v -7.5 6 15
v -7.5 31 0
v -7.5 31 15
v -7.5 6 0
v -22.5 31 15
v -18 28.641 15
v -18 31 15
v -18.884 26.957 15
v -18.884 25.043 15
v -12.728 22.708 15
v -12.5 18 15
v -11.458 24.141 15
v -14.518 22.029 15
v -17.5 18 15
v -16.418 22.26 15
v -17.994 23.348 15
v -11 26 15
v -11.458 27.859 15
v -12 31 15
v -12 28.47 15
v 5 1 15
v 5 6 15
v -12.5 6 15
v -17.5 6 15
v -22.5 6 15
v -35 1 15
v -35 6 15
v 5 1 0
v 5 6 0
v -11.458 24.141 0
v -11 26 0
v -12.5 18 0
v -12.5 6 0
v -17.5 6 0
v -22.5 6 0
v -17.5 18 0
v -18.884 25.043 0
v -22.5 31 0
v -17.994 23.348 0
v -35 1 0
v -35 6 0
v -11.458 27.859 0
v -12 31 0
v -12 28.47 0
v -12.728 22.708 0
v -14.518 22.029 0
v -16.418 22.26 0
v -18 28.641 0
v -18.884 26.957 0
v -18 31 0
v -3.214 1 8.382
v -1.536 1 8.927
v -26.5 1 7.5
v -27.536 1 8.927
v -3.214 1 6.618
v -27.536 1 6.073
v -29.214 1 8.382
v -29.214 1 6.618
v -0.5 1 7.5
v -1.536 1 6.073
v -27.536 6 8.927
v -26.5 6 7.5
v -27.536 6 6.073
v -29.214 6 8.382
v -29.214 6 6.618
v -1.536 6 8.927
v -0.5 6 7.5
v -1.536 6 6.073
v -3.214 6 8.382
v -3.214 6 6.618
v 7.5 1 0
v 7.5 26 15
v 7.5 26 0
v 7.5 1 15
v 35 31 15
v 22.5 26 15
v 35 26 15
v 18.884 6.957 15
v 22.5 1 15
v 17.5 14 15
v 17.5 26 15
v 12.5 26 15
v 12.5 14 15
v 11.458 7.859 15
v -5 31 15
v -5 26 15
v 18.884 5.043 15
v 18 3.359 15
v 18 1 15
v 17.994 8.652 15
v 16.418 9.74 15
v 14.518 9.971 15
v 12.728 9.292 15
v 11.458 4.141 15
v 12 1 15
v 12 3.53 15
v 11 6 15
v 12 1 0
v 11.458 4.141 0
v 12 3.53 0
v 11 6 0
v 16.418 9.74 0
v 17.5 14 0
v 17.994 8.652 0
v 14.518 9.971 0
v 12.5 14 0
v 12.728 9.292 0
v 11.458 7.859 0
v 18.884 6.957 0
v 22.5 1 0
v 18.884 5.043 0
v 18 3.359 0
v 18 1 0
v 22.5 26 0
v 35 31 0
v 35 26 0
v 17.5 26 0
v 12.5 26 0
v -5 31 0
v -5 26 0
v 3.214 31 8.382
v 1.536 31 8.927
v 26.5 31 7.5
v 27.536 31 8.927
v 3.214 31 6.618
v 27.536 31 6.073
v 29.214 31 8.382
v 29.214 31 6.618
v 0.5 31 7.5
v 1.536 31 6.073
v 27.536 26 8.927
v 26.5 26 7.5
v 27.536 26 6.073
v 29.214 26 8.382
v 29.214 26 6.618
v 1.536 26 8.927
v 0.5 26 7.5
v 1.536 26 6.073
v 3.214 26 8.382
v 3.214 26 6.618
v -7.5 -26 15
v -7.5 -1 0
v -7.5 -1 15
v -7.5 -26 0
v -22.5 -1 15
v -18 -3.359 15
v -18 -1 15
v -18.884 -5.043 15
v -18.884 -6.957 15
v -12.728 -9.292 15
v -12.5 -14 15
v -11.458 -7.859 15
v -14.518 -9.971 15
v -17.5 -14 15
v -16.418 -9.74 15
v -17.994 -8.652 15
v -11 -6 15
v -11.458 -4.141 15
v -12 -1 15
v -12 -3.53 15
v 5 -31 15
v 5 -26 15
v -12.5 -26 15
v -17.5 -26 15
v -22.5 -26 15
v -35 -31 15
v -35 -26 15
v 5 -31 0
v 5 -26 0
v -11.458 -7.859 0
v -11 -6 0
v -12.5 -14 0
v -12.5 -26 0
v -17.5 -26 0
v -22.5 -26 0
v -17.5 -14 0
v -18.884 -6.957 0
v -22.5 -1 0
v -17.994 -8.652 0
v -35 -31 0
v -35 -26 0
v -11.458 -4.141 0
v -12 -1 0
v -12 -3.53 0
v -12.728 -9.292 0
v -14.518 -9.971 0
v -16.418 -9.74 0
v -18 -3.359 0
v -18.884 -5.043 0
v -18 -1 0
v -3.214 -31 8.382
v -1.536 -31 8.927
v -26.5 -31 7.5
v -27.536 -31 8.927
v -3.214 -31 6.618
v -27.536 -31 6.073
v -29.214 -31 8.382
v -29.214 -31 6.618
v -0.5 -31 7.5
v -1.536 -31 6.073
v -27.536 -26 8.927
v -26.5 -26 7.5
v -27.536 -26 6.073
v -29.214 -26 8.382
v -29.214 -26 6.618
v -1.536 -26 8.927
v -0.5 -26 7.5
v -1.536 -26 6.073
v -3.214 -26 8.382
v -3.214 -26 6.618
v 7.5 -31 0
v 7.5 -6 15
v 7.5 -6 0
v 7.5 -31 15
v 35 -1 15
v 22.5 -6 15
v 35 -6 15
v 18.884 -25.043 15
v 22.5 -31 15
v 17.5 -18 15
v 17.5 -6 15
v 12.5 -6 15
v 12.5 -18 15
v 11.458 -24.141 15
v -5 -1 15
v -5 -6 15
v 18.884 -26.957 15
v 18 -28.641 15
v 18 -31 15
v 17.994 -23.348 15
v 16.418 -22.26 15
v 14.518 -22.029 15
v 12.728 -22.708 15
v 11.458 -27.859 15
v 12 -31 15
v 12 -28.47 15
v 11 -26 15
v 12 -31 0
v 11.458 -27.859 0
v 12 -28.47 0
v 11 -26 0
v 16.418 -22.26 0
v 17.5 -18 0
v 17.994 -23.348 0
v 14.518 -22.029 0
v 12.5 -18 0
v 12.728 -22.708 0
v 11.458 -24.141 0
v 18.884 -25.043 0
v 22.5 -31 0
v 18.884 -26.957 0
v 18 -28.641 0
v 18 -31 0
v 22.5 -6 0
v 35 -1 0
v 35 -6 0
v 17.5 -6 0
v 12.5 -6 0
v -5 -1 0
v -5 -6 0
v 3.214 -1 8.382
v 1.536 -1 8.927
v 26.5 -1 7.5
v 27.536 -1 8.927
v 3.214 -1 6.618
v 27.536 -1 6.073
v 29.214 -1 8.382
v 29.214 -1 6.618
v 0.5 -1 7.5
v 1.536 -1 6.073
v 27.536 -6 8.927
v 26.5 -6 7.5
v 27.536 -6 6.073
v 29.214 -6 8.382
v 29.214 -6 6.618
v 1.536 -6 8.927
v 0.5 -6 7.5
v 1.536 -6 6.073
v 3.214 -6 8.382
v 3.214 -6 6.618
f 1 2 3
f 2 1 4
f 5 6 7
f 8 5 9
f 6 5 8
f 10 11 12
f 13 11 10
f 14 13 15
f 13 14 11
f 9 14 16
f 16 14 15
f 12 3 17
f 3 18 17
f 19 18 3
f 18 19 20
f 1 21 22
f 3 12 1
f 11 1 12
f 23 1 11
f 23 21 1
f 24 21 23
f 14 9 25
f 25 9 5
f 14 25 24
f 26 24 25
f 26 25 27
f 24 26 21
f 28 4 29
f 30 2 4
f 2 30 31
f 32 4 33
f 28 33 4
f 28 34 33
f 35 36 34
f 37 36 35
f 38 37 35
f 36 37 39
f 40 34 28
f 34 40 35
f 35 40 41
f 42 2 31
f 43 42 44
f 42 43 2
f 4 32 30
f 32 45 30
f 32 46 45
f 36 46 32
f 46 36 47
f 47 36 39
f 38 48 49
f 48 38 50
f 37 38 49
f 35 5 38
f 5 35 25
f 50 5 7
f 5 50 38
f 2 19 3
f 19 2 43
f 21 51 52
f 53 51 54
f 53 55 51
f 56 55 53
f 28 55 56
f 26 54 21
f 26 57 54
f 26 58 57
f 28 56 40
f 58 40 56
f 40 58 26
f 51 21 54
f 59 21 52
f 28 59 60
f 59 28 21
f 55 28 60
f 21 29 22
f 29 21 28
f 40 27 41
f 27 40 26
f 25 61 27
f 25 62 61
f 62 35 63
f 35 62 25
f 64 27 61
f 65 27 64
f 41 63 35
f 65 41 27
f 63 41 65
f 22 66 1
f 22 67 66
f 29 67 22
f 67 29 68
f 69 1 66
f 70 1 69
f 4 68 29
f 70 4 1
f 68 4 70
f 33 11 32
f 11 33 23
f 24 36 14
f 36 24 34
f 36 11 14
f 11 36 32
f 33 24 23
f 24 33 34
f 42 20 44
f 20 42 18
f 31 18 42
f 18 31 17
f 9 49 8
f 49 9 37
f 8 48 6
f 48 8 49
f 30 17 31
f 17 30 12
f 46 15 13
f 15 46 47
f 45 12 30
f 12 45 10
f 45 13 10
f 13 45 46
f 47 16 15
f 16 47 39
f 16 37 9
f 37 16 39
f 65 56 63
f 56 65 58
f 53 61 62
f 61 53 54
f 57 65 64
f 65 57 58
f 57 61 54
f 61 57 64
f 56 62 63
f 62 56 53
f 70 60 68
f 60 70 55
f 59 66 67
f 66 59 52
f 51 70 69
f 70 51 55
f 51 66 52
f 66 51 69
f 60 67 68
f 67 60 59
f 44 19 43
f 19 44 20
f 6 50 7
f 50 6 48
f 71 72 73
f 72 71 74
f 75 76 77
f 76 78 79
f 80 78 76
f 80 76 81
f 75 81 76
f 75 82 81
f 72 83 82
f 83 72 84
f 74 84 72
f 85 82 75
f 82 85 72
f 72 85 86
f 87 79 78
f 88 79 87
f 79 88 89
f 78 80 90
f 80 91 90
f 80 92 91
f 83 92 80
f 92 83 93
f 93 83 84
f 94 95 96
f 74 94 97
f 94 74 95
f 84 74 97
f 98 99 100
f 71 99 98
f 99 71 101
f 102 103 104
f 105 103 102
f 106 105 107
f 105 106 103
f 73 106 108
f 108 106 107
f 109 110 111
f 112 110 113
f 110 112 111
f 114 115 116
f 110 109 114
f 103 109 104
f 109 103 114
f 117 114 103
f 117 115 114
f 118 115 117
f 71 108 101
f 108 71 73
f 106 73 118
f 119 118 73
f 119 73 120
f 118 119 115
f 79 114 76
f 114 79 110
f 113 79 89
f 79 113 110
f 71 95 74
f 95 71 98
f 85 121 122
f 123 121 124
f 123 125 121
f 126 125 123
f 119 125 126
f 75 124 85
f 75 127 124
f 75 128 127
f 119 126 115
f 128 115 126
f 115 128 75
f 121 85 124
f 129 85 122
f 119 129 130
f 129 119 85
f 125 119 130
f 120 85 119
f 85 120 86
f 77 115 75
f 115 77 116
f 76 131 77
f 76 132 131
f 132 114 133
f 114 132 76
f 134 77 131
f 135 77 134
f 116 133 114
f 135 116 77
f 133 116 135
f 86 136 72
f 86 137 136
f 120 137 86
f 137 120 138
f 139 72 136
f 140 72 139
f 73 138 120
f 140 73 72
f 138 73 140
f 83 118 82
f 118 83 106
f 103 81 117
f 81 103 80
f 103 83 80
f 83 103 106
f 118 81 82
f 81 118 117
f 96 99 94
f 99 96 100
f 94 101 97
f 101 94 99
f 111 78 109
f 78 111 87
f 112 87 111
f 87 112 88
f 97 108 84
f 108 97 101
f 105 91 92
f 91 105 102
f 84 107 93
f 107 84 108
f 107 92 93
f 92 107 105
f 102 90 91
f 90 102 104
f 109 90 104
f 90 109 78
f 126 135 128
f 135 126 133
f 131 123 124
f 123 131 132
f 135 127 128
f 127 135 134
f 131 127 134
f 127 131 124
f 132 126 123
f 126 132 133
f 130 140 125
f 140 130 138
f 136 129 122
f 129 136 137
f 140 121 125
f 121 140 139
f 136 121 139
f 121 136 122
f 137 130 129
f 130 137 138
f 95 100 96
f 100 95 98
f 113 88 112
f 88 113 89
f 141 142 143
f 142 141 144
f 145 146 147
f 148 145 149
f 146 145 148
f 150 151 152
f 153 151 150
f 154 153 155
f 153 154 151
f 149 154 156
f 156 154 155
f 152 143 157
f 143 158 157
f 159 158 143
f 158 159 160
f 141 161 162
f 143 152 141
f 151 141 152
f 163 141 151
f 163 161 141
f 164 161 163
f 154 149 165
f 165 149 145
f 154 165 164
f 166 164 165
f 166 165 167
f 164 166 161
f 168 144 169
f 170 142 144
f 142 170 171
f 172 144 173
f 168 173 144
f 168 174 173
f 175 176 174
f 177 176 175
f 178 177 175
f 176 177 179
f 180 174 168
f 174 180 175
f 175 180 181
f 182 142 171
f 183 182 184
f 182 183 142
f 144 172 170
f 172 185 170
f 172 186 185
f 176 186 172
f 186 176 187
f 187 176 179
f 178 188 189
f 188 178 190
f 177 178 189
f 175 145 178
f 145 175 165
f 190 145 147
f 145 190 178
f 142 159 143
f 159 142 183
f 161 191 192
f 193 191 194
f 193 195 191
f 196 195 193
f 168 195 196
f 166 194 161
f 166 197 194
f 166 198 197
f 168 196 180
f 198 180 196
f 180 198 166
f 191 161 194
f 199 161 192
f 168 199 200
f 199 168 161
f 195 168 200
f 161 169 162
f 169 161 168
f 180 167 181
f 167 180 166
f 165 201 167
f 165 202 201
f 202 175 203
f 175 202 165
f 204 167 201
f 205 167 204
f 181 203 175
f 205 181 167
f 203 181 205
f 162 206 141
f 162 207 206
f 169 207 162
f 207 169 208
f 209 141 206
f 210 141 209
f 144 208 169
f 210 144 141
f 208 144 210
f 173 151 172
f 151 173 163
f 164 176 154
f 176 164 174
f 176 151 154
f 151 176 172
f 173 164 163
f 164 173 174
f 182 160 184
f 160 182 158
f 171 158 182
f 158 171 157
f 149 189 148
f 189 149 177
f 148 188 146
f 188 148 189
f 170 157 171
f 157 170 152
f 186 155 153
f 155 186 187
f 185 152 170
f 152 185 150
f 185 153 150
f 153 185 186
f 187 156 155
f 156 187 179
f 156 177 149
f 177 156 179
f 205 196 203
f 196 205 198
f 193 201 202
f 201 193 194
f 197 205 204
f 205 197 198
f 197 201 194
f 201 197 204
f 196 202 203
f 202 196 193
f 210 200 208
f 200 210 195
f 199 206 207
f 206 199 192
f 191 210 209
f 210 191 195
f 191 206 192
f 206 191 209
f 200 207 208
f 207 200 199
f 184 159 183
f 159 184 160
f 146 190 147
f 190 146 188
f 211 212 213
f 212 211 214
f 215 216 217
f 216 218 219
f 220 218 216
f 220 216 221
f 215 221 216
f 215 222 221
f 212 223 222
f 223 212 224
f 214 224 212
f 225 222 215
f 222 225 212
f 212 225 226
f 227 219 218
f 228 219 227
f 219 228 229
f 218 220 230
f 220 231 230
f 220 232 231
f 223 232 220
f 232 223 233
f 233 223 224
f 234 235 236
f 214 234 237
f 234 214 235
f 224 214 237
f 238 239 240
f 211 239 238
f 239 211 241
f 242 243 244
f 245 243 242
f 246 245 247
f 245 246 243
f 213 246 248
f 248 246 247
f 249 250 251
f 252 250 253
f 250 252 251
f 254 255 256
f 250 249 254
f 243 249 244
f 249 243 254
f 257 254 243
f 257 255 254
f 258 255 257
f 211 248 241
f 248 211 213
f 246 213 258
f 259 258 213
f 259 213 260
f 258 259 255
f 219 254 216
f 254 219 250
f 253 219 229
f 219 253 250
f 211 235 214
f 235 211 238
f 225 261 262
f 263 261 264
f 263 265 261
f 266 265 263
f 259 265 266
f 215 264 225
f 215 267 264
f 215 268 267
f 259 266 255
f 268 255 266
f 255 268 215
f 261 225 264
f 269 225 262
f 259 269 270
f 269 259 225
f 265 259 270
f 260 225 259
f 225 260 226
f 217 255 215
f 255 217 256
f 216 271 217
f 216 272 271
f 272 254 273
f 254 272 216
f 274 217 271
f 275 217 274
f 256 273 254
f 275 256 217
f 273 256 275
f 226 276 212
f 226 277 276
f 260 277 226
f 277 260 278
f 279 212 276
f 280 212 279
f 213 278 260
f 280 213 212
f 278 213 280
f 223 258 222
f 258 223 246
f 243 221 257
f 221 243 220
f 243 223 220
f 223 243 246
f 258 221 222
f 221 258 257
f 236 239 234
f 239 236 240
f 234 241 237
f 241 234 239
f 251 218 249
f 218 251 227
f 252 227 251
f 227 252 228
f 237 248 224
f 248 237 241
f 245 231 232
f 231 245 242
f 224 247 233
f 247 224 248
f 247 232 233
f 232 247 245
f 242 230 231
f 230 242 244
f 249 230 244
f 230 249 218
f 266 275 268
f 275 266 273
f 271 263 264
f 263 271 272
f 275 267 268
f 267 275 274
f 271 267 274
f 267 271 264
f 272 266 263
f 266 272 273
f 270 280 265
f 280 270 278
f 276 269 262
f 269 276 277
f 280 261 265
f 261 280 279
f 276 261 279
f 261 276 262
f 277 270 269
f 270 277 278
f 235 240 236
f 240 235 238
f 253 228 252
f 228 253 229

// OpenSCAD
// rod holder for prusa i3 in folded position
module foldingclamp() {
difference(){
union(){
translate([-7.5,0,0])rotate([0,0,0])cube(size = [15,30,15]);
translate([-20,0,0])rotate([0,0,0])cube(size = [40,5,15]);
//translate([0,23,0])rotate([0,0,45])cube(size = [6,6,15]);
}
translate([-2.5,5,-2])rotate([0,0,0])cube(size = [5,12,20]); //lightening hole
translate([0,25,-1])rotate([0,0,0])cylinder(h=20, r=4); //main rod attachment hole
translate([-13,10,7.5])rotate([90,0,0])cylinder(h=20, r=1.5); //screw attachment hole
translate([13,10,7.5])rotate([90,0,0])cylinder(h=20, r=1.5); //screw attachment hole
translate([-3,23,-2])rotate([0,0,0])cube(size = [6,12,20]); //rod access hole

}
}

//foldingclamp();
translate([-15,1,0])rotate([0,0,0])foldingclamp();
translate([15,31,0])rotate([0,0,180])foldingclamp();
translate([-15,-31,0])rotate([0,0,0])foldingclamp();
translate([15,-1,0])rotate([0,0,180])foldingclamp();
